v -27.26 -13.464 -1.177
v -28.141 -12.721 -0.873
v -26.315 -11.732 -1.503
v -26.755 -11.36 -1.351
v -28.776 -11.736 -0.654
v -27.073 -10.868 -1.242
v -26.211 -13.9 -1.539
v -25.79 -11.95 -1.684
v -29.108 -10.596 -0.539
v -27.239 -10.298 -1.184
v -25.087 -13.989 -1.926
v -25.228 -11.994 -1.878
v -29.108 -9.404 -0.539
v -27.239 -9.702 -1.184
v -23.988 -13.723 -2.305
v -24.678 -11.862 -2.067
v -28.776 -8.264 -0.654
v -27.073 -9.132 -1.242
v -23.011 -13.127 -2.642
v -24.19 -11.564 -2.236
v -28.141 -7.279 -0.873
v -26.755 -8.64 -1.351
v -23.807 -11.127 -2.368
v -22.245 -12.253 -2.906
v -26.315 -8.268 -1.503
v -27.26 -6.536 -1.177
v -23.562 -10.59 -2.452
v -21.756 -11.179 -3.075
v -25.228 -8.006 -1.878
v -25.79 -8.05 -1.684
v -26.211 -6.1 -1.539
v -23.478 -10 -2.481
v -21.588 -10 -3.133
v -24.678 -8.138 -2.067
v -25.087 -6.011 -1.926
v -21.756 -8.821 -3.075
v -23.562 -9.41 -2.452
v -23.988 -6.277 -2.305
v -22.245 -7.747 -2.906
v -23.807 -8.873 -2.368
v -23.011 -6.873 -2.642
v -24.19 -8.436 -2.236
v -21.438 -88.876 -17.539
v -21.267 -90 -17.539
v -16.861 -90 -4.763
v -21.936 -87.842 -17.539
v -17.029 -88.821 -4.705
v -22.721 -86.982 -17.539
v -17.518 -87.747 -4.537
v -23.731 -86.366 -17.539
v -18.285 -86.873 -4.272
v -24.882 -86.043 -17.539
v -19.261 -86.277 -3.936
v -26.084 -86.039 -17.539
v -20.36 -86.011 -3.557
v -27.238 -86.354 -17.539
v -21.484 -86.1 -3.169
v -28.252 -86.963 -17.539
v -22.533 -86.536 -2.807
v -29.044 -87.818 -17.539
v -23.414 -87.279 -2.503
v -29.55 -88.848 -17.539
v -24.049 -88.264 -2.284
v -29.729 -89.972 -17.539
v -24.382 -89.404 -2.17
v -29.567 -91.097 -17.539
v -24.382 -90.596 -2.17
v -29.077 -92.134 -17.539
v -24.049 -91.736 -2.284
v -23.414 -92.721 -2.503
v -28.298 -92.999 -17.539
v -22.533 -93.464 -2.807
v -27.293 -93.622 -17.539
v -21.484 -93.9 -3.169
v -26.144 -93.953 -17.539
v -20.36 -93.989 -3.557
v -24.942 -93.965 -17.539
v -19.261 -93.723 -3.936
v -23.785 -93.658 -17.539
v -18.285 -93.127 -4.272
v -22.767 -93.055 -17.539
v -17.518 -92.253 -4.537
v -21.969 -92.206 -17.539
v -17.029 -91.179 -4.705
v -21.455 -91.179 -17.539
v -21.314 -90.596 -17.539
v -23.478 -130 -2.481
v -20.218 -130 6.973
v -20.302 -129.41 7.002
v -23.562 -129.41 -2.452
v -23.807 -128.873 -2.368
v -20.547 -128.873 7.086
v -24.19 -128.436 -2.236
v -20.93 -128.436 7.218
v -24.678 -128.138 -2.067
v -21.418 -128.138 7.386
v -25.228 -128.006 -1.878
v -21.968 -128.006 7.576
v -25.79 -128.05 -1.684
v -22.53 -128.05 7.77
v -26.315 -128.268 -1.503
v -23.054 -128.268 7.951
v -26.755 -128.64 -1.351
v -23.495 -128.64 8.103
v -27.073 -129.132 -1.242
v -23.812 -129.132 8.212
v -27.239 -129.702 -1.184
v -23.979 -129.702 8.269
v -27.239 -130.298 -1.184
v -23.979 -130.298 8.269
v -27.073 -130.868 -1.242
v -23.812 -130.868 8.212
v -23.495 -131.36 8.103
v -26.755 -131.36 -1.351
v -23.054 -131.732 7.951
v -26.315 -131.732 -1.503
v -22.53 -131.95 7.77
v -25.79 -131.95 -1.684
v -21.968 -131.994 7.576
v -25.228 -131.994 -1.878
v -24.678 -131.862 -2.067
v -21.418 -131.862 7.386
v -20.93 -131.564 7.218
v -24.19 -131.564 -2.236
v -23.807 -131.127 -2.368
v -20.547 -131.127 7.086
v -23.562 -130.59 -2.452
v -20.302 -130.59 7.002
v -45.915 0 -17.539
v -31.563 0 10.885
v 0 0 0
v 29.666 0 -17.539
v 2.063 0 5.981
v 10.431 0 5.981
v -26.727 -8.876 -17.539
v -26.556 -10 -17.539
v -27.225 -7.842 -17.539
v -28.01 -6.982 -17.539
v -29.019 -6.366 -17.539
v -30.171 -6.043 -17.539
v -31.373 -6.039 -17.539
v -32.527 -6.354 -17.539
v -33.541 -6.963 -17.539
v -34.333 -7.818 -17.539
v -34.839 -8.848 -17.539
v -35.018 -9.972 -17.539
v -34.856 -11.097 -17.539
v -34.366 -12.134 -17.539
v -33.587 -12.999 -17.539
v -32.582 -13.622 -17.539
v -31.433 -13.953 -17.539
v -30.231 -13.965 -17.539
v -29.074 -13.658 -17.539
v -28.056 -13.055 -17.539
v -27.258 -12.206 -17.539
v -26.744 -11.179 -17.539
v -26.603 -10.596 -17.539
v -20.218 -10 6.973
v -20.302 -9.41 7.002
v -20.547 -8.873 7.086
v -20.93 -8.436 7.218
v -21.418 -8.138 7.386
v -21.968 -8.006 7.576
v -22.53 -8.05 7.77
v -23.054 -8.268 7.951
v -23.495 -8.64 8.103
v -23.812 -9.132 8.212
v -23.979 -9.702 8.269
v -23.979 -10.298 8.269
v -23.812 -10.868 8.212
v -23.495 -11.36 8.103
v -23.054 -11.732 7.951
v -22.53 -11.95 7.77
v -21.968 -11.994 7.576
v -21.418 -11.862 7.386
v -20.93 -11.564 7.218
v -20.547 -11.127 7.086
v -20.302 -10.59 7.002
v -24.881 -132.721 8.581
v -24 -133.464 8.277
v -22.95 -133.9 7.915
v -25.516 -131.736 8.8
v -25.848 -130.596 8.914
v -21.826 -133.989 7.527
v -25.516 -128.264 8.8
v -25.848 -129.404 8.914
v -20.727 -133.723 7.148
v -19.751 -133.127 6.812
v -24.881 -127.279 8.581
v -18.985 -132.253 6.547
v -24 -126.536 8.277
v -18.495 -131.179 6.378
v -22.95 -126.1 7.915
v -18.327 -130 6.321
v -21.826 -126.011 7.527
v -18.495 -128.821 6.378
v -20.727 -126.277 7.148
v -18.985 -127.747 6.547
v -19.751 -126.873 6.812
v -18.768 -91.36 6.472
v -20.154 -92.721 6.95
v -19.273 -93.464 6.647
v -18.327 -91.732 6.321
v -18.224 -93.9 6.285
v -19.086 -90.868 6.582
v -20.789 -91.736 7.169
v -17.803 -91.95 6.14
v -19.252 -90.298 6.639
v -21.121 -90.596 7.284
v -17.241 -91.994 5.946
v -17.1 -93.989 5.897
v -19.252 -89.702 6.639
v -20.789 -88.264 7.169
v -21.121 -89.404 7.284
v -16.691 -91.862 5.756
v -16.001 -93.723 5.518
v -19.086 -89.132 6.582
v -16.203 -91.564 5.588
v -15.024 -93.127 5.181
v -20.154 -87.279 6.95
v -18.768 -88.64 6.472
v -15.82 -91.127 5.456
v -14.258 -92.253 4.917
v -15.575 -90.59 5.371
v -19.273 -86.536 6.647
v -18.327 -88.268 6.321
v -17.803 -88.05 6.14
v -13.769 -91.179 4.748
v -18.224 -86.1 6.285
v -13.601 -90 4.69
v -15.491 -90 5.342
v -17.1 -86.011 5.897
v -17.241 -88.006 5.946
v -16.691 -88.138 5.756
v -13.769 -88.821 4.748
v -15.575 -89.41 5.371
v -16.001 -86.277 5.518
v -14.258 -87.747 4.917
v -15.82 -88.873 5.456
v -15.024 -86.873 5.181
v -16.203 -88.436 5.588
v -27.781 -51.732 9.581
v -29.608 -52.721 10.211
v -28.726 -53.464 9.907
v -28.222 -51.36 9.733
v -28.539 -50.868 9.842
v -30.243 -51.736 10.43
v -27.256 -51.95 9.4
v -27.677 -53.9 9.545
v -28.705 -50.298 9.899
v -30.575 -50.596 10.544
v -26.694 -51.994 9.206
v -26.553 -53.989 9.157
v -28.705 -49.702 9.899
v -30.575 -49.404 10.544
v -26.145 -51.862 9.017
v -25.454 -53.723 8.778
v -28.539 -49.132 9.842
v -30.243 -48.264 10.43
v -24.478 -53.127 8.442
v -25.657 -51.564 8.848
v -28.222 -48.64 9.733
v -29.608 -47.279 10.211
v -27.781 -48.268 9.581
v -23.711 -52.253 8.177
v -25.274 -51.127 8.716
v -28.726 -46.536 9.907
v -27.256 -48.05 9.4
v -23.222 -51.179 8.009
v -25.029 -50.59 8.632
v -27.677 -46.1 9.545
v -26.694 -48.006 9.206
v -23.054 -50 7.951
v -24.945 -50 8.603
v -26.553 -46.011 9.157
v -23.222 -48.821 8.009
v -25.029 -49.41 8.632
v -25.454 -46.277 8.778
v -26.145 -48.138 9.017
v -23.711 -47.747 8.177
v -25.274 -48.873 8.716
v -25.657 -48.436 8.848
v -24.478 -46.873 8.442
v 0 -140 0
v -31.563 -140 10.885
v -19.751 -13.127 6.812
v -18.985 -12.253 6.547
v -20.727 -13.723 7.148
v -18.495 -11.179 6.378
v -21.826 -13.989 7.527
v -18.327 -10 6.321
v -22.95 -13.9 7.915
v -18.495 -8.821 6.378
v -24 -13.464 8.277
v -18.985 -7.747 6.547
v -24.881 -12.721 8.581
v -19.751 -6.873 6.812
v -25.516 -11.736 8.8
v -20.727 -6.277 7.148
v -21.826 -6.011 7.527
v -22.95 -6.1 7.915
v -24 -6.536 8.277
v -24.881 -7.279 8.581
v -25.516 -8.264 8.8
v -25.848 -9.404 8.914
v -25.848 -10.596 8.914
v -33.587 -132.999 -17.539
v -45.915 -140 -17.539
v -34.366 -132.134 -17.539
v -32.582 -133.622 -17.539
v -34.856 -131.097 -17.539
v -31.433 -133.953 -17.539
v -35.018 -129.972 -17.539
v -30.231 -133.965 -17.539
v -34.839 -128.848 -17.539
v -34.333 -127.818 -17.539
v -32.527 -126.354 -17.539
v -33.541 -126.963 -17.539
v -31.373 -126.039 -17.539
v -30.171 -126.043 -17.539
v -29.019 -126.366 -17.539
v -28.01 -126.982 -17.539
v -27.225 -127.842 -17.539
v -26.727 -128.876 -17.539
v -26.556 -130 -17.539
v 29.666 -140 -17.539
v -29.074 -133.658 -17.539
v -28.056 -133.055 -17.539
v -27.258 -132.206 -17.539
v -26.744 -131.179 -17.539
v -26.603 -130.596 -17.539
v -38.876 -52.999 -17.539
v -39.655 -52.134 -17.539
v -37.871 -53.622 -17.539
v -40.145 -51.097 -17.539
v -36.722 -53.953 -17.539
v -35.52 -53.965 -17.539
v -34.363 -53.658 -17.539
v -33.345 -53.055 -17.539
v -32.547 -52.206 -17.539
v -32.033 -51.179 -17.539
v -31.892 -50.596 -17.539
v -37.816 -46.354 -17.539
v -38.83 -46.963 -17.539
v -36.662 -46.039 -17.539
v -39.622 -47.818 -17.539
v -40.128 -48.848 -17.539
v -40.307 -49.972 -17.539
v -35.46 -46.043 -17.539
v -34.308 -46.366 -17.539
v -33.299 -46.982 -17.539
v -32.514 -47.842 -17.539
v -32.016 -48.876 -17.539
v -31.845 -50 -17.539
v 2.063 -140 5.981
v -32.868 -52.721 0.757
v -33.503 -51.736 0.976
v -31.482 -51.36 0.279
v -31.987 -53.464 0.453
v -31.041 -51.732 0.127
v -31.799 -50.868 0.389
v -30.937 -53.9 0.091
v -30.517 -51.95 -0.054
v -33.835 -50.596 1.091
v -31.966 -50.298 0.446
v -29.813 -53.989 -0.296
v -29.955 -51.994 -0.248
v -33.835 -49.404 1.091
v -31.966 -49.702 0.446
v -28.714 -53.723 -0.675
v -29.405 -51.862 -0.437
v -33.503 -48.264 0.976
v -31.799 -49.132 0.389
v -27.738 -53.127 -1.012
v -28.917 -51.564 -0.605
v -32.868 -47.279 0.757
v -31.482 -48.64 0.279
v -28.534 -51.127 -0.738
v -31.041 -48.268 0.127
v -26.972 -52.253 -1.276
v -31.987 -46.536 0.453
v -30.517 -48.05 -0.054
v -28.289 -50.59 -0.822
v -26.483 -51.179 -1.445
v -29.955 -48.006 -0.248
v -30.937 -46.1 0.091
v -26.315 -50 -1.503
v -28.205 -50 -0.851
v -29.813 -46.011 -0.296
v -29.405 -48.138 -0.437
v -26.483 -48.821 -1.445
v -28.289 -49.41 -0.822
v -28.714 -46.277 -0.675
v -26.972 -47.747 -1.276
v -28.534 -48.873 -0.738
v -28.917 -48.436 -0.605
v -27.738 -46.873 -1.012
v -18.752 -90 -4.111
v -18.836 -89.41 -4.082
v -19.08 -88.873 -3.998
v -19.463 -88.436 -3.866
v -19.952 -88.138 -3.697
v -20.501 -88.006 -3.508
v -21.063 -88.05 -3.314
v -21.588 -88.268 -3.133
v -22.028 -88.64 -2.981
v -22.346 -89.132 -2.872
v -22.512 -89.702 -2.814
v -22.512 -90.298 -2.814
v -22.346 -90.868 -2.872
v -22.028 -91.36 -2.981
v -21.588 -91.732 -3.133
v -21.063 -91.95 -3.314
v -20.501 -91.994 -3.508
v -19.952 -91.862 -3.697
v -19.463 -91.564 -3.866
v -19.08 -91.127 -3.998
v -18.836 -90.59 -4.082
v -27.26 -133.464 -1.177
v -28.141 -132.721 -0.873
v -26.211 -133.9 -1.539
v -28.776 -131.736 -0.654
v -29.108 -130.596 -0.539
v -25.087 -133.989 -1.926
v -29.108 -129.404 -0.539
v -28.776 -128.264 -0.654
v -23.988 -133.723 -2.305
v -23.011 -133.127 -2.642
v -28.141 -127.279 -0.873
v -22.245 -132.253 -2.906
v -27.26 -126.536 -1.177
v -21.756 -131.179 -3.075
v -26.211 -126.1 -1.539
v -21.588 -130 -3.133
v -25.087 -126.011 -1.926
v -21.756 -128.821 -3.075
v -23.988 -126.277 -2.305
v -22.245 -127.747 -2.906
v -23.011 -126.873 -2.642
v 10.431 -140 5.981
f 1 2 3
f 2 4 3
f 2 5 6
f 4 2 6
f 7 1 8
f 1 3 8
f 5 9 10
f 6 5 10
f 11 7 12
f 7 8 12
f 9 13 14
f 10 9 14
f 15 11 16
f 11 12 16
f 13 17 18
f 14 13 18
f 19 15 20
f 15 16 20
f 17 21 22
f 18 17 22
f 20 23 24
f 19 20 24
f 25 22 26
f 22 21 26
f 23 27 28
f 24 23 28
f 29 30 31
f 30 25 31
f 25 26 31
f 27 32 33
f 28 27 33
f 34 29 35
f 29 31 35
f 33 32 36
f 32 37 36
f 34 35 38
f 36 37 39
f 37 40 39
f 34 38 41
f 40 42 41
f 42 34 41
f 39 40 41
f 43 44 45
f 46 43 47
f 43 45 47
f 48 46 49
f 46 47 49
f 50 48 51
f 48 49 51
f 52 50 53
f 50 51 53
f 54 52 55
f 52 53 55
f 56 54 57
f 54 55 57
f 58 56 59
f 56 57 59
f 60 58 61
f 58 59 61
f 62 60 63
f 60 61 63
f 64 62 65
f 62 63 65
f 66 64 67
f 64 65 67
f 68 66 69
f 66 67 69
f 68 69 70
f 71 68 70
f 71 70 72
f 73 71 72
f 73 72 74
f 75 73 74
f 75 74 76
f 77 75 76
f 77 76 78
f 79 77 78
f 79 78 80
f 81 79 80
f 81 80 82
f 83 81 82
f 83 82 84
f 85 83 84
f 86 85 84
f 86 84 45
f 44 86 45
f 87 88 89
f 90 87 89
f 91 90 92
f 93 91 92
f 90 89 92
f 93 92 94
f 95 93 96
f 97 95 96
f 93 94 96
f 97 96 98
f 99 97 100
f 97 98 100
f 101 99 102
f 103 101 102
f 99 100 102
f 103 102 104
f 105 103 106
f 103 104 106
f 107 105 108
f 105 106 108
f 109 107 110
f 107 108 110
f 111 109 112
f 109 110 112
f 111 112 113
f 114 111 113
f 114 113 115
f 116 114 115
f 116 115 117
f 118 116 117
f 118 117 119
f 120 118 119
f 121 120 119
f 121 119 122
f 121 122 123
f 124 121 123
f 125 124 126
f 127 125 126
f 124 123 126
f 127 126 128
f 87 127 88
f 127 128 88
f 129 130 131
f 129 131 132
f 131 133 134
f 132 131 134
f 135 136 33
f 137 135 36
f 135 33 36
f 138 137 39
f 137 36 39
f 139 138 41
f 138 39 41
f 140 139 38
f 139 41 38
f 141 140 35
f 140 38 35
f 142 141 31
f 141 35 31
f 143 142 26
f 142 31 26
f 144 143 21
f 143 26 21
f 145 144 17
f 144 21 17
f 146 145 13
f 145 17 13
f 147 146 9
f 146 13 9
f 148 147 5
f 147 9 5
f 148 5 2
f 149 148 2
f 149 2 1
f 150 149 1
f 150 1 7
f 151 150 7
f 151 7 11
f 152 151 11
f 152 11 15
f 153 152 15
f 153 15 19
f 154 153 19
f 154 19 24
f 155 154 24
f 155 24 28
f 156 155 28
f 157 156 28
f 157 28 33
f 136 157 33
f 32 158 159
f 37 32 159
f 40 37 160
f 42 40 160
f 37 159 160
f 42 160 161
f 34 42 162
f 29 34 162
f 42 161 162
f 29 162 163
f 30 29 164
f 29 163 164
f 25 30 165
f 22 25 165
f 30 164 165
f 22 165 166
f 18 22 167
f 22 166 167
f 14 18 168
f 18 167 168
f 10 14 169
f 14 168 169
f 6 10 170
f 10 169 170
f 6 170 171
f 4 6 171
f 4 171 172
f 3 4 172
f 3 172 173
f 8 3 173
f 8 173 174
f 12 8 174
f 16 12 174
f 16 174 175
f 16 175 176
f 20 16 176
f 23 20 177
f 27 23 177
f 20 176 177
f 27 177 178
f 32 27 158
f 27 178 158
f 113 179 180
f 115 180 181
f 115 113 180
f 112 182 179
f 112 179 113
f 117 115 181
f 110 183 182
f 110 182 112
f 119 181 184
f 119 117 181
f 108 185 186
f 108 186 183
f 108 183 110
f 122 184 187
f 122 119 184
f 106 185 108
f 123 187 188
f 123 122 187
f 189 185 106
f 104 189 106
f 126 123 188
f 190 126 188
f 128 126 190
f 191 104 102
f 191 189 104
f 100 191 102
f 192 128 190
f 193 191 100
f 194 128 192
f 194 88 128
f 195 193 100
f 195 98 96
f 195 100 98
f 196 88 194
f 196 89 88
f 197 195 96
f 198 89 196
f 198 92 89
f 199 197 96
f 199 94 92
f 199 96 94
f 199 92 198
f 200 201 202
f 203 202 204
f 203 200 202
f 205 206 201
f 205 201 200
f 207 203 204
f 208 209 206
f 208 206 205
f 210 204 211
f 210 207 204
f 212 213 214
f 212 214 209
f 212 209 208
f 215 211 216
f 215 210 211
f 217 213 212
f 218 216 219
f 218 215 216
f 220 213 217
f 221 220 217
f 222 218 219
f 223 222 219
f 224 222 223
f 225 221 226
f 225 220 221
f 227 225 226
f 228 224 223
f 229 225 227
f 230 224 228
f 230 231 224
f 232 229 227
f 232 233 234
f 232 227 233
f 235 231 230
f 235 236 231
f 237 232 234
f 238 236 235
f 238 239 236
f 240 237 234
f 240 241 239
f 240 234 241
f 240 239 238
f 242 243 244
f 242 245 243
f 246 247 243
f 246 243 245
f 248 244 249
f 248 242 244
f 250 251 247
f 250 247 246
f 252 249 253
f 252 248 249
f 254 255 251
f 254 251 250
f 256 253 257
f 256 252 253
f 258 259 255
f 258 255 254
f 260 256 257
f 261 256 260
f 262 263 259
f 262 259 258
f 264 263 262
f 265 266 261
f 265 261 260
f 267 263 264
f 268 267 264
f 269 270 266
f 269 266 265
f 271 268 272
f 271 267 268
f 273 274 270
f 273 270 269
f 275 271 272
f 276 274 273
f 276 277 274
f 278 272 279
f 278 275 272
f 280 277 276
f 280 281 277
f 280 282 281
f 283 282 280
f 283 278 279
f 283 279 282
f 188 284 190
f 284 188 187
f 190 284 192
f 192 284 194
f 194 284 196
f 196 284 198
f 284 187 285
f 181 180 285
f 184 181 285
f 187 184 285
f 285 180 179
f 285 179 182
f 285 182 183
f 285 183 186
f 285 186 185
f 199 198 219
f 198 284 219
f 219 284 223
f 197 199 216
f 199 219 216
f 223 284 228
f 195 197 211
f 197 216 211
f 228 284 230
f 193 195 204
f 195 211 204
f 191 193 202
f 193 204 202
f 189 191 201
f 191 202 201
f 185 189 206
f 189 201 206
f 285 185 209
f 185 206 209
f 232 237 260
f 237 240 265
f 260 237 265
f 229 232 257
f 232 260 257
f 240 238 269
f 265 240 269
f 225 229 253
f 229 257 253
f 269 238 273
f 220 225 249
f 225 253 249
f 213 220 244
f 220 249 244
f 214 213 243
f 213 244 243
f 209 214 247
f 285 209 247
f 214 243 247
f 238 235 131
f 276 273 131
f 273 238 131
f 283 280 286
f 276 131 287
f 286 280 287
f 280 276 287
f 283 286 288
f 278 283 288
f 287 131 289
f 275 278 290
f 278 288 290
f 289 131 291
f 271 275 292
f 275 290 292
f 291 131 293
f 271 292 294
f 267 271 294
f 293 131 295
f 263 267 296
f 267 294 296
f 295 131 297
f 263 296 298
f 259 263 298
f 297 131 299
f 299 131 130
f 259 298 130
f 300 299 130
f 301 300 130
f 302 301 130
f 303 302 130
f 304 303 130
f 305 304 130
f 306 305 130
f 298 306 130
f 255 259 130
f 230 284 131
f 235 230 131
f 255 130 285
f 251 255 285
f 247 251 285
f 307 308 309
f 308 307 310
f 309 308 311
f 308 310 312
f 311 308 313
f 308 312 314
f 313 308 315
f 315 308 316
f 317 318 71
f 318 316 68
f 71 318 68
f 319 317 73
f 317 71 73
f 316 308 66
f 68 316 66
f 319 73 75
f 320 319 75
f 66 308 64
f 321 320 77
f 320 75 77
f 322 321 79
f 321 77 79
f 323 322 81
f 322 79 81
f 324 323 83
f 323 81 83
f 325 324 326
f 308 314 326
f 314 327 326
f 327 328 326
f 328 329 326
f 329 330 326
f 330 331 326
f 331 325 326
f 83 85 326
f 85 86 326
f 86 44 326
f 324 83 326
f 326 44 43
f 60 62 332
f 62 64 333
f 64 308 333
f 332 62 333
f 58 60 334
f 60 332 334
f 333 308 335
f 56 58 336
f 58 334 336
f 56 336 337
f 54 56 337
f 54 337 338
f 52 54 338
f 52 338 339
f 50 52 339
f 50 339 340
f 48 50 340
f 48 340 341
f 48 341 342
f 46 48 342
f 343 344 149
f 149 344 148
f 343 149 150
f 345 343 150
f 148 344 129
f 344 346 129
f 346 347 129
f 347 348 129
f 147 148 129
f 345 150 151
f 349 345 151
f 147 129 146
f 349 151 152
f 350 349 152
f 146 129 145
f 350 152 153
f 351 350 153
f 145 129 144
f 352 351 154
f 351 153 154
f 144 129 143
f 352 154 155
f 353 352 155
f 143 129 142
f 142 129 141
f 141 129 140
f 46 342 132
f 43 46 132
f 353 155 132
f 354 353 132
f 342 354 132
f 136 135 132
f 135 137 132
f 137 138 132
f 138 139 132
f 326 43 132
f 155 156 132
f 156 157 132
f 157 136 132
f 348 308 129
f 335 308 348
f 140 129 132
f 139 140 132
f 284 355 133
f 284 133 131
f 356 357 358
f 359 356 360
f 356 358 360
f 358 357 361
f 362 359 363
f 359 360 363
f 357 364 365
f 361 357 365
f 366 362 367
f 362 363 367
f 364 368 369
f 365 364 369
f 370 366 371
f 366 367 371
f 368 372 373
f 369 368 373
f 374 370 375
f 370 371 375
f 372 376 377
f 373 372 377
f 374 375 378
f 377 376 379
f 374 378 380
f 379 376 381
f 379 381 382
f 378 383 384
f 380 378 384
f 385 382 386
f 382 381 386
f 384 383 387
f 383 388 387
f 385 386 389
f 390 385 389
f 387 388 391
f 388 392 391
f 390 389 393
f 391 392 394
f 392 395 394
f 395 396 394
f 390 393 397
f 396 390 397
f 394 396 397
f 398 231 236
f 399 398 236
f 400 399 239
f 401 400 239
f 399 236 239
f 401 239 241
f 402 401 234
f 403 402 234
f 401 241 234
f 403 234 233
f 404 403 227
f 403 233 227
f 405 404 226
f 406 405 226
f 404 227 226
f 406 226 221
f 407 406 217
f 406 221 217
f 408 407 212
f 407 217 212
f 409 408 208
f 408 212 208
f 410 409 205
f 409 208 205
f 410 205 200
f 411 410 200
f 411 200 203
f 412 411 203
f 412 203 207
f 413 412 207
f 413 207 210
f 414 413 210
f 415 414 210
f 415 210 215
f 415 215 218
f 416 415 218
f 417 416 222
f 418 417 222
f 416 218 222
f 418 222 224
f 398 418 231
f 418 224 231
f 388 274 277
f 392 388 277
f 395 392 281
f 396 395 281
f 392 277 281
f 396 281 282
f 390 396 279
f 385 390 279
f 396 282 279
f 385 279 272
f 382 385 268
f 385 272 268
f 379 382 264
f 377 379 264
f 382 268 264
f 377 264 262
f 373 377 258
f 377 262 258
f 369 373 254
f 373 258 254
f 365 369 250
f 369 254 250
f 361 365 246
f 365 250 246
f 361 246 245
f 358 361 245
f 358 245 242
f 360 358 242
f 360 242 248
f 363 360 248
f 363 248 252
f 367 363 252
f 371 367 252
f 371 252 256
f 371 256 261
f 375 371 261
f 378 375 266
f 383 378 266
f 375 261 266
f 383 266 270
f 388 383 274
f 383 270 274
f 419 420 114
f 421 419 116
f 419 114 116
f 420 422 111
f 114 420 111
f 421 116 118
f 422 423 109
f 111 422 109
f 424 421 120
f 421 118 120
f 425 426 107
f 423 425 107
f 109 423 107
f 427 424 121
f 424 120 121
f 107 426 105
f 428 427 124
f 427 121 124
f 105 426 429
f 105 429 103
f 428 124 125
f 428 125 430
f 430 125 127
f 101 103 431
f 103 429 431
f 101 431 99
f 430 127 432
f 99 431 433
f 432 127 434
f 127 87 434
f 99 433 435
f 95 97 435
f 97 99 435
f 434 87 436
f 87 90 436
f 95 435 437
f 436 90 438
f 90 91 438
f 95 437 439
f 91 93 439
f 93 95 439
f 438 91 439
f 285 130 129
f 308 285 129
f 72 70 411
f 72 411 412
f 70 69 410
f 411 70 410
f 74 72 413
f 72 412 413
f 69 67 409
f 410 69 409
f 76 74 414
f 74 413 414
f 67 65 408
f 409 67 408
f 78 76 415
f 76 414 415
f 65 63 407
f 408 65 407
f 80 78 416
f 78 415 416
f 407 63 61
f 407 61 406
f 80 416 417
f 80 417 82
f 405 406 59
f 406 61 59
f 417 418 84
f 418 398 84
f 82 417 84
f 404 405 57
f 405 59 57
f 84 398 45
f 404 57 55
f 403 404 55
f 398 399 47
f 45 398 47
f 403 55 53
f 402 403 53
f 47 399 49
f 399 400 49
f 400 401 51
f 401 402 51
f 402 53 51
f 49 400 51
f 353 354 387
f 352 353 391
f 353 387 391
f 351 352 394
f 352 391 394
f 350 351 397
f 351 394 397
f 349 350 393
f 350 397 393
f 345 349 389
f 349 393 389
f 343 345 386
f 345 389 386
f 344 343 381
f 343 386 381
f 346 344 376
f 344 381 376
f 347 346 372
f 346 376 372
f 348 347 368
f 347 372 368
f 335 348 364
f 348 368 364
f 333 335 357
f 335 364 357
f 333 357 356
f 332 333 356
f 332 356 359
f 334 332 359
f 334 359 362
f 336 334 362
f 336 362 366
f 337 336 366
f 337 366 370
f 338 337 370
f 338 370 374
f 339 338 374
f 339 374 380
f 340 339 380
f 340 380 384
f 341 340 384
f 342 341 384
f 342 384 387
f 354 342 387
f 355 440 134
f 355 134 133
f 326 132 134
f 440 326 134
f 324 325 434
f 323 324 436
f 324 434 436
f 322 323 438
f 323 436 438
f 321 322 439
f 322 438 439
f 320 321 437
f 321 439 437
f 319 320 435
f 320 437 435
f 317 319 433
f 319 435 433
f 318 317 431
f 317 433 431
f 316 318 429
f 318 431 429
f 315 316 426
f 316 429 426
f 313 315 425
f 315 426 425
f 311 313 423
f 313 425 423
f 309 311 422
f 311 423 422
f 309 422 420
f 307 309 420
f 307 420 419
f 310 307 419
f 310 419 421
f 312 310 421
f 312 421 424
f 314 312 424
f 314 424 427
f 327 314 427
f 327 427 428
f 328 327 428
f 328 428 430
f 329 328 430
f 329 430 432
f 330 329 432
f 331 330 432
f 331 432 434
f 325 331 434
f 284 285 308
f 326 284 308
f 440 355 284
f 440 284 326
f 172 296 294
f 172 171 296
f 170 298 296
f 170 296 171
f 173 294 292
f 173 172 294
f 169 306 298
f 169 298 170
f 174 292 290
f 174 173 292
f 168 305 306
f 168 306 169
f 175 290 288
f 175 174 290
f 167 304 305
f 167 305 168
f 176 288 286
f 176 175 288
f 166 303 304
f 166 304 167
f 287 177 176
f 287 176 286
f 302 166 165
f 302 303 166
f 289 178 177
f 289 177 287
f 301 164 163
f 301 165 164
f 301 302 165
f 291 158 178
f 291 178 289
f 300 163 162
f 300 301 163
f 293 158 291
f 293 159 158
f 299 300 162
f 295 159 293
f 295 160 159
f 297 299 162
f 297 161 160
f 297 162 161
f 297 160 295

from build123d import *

# Parameters (mm, degrees)
F1_DEPTH = 140
F2_R     = 4
F3_DEPTH = 30
F4_R     = 4
F4_R_2   = 2
F5_DEPTH = 10


with BuildPart() as f1:
    # F0 (on Front) → F1 (new body)
    with BuildSketch(Plane.XZ):
        Polygon((2.0625628796, 5.9807691723), (0, 0), (-31.5625444055, 10.8848428354), (-45.9147356451, -17.5394751132), (29.6659134328, -17.5394751132), (10.4307364672, 5.9807691723), align=None)
    extrude(amount=F1_DEPTH)

    # F2 (on face) → F3 (cut)
    with BuildSketch(Plane(origin=(0, 0, 0), x_dir=(0.9453618412, 0, -0.3260229889), z_dir=(0.3260229889, 0, 0.9453618412))):
        with Locations((-23.3867340855, -10)):
            Circle(F2_R)
        with Locations((-28.3867340855, -50)):
            Circle(F2_R)
        with Locations((-23.3867340855, -130)):
            Circle(F2_R)
        with Locations((-18.3867340855, -90)):
            Circle(F2_R)
    extrude(amount=-F3_DEPTH, mode=Mode.SUBTRACT)

    # F4 (on face) → F5 (join)
    with BuildSketch(Plane(origin=(0, 0, 0), x_dir=(0.9453618412, 0, -0.3260229889), z_dir=(0.3260229889, 0, 0.9453618412))):
        with Locations((-23.3867340855, -10)):
            Circle(F4_R)
        with Locations((-23.3867340855, -10)):
            Circle(F4_R_2, mode=Mode.SUBTRACT)
        with Locations((-23.3867340855, -130)):
            Circle(F4_R)
        with Locations((-23.3867340855, -130)):
            Circle(F4_R_2, mode=Mode.SUBTRACT)
        with Locations((-28.3867340855, -50)):
            Circle(F4_R)
        with Locations((-28.3867340855, -50)):
            Circle(F4_R_2, mode=Mode.SUBTRACT)
        with Locations((-18.3867340855, -90)):
            Circle(F4_R)
        with Locations((-18.3867340855, -90)):
            Circle(F4_R_2, mode=Mode.SUBTRACT)
    extrude(amount=-F5_DEPTH)


solid = f1.part
